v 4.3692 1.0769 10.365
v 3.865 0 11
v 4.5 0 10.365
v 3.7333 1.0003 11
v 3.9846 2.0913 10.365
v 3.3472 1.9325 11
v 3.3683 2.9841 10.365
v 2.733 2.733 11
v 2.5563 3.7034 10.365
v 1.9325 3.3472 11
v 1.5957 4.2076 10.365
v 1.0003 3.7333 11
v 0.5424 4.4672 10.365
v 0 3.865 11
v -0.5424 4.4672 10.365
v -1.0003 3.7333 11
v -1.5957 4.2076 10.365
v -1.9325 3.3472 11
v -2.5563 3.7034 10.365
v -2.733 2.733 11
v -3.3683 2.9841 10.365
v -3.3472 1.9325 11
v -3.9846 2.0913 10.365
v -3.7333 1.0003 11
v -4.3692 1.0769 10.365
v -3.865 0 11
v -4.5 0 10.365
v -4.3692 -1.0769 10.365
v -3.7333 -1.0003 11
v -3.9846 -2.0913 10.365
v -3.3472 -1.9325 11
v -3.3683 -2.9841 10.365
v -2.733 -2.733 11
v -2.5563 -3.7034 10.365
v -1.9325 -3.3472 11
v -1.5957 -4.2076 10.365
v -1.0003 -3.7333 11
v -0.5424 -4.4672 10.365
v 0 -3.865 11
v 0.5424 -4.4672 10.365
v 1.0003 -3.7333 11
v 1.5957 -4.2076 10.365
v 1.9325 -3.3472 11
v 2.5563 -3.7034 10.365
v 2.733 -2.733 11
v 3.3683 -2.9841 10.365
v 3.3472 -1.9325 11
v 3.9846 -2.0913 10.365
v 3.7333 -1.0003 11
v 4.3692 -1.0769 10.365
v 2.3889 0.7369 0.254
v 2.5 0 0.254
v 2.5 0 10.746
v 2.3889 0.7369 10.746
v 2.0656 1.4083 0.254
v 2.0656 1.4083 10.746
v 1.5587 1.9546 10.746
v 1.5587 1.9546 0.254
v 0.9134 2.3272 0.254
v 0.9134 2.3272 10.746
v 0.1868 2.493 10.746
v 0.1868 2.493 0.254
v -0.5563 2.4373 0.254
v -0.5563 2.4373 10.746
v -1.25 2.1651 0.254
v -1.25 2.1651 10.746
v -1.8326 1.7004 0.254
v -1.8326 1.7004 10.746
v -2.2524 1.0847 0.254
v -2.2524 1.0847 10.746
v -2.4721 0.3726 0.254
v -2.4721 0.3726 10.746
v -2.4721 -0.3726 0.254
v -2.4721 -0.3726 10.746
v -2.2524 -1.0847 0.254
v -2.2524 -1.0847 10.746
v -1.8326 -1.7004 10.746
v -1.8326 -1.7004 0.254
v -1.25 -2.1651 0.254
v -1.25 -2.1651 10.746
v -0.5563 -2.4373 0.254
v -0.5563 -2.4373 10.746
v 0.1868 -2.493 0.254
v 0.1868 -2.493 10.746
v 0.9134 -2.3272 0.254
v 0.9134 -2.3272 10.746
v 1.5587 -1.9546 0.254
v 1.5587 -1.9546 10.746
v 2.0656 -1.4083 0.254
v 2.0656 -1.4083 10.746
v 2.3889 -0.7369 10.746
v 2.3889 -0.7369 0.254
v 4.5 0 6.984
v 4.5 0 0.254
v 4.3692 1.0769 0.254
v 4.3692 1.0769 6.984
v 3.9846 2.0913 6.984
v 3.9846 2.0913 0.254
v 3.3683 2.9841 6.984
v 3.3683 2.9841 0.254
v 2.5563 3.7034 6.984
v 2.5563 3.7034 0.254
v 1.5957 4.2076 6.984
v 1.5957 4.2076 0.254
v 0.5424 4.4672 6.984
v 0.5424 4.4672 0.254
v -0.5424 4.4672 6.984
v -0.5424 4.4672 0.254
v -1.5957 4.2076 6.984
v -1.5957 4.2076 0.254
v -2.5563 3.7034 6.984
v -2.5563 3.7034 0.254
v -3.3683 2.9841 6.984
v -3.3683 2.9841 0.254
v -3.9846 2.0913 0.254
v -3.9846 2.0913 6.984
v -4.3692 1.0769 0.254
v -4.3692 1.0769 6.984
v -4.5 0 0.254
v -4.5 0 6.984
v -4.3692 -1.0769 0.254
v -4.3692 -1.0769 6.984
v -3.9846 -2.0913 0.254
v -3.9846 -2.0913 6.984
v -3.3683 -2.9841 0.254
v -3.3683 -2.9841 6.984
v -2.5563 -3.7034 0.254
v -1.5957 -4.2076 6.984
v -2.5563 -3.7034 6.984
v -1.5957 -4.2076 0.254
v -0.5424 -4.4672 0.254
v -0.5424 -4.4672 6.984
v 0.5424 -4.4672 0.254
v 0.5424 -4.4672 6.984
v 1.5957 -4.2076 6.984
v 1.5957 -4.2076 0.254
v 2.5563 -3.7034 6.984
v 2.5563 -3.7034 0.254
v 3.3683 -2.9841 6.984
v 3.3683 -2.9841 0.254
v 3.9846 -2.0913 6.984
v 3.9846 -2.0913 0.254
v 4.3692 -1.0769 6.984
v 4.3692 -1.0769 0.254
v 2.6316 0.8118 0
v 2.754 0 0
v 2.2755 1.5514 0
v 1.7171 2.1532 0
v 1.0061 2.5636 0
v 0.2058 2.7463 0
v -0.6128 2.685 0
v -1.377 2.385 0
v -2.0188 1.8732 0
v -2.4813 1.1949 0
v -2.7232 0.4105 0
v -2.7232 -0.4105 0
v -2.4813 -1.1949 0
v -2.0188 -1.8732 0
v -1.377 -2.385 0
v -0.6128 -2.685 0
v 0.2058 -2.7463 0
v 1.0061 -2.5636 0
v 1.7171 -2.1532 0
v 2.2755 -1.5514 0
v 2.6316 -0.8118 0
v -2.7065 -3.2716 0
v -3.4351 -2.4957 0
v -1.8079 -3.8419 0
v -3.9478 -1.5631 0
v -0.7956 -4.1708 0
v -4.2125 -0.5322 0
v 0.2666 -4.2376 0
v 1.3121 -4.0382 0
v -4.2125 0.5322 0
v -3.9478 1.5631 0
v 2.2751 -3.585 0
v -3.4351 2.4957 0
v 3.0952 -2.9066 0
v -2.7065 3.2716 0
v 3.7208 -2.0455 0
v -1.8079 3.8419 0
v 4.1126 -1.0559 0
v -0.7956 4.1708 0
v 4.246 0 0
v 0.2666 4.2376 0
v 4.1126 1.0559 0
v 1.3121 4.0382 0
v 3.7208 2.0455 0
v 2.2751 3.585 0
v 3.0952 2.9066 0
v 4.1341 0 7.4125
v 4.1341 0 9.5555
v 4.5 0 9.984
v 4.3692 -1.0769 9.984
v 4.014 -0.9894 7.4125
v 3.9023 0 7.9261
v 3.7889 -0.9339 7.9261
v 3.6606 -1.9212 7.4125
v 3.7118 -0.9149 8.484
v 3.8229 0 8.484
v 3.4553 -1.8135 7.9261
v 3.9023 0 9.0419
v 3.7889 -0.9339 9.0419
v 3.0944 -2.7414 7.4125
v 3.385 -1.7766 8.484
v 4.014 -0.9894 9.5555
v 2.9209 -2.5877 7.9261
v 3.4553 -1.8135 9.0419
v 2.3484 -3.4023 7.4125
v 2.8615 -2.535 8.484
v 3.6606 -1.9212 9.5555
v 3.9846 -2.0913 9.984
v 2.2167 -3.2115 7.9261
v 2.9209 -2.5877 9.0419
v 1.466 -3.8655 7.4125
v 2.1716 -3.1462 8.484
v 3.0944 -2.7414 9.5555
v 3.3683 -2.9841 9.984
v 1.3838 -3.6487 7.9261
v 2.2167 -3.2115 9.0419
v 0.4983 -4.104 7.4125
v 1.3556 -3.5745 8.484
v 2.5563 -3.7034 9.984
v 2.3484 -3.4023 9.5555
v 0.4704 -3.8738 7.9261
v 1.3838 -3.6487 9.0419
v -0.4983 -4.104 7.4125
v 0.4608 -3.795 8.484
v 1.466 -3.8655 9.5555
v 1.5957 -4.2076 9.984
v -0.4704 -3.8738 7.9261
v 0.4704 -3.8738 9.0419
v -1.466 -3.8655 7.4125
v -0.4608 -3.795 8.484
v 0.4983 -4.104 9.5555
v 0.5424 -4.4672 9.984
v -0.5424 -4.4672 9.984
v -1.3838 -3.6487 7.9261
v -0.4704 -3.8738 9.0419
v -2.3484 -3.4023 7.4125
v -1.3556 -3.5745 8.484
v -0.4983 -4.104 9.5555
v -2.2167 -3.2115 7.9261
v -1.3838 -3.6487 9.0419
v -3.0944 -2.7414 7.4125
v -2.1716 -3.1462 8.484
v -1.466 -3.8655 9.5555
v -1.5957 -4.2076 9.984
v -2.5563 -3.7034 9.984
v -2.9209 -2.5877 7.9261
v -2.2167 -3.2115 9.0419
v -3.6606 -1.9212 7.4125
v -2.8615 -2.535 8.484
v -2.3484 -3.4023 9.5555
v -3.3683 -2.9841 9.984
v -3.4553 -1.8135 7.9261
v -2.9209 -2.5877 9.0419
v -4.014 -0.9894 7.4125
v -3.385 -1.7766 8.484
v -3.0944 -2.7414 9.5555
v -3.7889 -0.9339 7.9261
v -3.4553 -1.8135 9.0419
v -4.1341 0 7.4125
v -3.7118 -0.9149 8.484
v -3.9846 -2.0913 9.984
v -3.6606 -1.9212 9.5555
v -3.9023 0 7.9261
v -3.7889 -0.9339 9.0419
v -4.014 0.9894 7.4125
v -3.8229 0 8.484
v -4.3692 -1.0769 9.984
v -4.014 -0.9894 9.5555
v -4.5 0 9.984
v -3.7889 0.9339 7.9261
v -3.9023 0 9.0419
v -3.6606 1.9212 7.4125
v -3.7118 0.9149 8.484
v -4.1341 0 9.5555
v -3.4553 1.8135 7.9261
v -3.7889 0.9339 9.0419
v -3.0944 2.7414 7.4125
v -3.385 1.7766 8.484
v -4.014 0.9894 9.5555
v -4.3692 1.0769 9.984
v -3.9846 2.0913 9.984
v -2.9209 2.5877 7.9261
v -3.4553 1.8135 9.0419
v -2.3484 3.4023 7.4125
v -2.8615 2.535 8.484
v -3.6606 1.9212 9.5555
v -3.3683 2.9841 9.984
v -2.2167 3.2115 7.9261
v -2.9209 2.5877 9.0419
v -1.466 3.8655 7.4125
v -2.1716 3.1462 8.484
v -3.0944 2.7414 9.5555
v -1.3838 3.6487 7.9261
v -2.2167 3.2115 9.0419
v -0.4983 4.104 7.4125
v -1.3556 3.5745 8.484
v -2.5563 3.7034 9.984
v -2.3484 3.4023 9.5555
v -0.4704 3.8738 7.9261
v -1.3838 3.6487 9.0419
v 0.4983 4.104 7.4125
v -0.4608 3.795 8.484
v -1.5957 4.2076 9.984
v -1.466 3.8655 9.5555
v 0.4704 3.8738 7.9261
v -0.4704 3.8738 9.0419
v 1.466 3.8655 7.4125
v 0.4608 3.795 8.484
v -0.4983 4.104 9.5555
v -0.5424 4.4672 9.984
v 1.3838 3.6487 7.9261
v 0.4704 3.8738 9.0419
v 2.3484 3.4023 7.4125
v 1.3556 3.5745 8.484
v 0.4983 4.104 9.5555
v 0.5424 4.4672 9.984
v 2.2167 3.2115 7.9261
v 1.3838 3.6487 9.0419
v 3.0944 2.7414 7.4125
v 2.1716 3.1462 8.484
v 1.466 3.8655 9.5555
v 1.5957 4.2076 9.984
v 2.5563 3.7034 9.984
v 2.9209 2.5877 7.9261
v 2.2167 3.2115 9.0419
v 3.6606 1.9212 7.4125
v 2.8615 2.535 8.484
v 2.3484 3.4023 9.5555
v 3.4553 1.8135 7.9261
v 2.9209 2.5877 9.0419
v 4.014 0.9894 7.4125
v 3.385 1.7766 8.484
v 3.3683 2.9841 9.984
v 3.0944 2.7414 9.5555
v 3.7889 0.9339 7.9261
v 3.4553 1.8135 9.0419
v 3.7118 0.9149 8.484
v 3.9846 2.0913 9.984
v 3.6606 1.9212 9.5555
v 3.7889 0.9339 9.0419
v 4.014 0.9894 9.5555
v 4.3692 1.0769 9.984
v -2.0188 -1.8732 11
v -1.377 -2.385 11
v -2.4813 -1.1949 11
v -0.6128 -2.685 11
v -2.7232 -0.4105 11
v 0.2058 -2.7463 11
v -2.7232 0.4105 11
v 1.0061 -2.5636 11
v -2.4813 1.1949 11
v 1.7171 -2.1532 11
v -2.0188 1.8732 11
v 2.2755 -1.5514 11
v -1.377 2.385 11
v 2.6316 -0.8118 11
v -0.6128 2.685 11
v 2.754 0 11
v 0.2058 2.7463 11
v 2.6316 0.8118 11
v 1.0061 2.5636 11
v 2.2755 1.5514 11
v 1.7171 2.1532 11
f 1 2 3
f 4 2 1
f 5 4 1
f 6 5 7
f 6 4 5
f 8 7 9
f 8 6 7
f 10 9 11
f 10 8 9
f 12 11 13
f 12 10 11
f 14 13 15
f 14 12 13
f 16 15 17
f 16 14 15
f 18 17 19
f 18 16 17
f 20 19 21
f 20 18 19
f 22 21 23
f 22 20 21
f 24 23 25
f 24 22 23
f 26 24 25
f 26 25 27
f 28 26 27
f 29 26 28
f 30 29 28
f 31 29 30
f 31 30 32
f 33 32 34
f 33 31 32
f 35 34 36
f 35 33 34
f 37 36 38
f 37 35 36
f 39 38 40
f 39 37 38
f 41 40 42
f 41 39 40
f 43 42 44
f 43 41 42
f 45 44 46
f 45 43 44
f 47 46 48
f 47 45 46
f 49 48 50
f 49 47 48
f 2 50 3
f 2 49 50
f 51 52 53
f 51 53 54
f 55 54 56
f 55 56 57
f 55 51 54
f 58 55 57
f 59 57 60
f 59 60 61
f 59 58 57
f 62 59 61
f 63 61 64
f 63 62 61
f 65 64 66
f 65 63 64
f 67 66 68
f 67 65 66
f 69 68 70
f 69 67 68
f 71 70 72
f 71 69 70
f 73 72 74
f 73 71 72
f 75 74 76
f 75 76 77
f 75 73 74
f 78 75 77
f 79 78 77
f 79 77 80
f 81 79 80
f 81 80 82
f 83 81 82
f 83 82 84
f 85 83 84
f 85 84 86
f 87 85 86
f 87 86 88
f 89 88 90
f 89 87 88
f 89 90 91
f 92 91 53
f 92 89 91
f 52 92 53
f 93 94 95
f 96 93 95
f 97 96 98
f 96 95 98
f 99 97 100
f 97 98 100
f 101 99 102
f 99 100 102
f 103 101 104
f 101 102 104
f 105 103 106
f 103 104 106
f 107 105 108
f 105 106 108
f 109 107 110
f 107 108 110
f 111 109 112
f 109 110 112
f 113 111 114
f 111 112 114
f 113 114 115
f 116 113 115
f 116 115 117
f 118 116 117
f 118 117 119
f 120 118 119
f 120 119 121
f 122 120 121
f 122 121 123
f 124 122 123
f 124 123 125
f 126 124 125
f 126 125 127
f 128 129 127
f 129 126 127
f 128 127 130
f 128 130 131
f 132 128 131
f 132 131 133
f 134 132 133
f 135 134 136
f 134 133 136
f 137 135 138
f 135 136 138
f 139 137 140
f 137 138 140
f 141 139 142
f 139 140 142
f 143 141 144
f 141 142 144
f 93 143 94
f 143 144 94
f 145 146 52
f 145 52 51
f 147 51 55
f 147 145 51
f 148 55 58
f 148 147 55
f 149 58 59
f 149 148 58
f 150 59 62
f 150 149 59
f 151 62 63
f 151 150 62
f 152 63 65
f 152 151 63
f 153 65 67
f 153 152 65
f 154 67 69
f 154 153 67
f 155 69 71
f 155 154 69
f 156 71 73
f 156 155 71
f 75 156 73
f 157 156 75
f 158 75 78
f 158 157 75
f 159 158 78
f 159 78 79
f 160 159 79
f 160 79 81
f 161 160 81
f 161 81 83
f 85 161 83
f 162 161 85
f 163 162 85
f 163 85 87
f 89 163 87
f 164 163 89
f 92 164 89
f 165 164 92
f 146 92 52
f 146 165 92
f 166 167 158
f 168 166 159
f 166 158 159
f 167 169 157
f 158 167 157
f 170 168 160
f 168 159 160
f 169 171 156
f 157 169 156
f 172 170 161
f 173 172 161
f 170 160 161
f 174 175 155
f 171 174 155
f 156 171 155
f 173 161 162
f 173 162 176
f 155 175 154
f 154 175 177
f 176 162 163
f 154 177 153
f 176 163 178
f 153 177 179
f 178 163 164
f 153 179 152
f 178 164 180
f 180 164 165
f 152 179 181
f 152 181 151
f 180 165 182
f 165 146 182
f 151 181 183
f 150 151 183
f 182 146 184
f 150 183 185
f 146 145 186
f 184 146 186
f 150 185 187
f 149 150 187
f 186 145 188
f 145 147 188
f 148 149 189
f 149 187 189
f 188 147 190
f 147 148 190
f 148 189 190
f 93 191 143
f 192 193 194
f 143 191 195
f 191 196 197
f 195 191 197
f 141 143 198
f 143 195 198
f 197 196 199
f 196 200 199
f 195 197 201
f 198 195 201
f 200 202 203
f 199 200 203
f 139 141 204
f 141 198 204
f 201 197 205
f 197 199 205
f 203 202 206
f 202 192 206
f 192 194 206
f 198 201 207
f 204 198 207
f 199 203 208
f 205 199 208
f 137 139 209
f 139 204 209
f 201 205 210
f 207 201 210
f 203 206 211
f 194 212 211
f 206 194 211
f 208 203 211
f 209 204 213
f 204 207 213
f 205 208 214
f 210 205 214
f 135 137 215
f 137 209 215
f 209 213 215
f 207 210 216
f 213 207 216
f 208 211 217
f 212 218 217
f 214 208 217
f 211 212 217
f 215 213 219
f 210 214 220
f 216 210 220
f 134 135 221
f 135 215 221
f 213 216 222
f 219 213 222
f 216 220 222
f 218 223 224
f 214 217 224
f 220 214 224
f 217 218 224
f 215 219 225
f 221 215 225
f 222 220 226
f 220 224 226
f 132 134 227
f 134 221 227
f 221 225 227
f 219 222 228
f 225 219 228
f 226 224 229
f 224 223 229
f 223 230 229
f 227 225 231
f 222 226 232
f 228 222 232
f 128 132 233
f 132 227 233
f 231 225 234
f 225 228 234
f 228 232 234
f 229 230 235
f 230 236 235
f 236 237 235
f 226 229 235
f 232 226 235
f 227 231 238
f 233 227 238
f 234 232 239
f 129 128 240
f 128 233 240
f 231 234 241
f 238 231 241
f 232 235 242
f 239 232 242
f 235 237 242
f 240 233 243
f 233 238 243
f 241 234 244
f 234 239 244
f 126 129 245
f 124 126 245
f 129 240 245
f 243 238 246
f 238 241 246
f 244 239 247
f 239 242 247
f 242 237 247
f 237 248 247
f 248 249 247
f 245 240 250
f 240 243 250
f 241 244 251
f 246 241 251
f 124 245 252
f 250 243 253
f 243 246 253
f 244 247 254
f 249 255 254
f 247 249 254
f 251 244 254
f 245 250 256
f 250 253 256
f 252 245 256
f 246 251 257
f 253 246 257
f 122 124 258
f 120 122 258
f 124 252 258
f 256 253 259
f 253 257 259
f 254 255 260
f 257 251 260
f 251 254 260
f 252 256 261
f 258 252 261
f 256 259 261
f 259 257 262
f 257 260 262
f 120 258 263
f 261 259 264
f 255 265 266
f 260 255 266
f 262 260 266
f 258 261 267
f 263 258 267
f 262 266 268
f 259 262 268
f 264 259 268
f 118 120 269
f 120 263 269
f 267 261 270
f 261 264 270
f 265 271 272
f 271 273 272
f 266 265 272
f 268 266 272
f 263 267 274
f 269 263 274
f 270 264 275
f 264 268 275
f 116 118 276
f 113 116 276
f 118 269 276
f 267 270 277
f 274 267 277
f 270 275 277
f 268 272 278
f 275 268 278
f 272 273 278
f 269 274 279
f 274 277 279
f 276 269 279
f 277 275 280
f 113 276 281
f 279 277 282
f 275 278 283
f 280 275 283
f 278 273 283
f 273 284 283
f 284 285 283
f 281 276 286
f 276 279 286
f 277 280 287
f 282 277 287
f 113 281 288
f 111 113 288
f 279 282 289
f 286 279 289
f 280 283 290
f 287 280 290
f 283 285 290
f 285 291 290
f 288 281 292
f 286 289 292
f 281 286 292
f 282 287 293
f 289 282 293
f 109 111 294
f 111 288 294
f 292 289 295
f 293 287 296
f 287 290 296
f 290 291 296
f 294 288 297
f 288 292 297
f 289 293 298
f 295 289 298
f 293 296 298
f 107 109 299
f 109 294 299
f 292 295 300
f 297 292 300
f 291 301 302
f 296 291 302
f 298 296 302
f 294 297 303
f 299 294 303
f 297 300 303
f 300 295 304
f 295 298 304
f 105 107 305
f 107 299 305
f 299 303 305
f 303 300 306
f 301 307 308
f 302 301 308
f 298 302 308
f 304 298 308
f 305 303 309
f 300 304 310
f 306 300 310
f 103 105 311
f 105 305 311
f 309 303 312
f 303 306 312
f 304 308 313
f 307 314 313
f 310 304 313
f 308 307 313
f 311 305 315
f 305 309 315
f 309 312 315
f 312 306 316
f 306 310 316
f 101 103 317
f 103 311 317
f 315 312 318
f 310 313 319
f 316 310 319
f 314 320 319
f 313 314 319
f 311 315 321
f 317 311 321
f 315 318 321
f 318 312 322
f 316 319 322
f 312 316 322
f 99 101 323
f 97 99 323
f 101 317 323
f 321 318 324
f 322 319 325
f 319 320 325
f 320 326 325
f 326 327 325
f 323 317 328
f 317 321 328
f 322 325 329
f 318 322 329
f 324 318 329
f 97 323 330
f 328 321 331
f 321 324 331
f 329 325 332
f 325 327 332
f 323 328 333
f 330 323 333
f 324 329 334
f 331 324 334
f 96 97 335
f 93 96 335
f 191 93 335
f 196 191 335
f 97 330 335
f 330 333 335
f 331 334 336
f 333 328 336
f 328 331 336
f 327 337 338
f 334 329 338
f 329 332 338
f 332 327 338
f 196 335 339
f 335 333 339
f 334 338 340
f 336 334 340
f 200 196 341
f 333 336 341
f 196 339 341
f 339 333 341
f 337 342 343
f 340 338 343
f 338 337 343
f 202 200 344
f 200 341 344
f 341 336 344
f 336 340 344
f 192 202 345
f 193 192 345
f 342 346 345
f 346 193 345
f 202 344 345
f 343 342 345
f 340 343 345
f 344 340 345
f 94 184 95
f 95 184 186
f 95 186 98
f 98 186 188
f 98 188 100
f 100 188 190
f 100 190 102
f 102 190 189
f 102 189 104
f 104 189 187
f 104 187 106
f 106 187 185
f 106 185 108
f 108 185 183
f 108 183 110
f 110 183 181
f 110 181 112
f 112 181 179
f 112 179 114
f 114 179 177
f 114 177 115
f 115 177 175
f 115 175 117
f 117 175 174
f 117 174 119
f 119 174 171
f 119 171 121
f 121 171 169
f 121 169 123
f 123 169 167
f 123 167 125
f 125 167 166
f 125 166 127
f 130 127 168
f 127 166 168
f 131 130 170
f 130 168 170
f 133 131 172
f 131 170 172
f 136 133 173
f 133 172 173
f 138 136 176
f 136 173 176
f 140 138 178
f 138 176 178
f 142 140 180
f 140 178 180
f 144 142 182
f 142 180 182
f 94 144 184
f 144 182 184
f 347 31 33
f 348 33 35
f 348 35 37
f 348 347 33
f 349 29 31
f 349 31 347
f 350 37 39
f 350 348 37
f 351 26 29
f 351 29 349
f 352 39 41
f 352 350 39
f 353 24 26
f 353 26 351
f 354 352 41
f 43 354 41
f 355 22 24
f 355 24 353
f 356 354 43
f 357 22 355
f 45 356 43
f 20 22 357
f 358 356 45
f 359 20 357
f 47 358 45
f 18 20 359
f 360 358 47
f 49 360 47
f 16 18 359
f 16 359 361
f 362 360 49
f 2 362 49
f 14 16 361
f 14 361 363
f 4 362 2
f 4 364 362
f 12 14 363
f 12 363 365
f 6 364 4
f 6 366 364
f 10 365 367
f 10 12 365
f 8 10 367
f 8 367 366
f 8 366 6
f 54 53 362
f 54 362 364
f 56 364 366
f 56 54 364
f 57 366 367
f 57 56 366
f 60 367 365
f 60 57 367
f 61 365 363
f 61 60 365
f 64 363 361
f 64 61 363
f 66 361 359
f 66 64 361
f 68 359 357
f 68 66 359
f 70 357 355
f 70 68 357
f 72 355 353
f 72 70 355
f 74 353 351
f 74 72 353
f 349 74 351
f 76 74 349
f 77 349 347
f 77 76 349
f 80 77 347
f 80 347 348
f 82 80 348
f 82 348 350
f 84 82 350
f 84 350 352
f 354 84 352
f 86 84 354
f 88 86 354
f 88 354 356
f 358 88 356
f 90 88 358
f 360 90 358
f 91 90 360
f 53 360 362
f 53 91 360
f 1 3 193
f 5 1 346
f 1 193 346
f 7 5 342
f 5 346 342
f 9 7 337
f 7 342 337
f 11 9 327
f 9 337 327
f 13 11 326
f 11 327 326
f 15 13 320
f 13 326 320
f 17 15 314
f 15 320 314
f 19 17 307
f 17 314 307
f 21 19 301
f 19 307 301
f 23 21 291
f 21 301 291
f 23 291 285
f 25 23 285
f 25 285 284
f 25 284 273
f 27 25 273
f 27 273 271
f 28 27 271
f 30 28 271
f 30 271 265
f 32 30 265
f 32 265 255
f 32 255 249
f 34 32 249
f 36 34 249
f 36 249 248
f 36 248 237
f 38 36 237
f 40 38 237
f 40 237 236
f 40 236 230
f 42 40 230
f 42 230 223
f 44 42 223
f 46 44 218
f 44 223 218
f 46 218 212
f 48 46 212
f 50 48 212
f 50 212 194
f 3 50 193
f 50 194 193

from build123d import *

# Parameters (mm, degrees)
SKETCH1_R           = 4.5
SKETCH1_R_2         = 2.5
BOSS_EXTRUDE1_DEPTH = 11
SKETCH2_R           = 2
CHAMFER1_SIZE       = 0.635
CHAMFER2_SIZE       = 0.254


with BuildPart() as part:
    # Sketch1 → Boss-Extrude1 (new body)
    with BuildSketch(Plane.XY):
        Circle(SKETCH1_R)
        Circle(SKETCH1_R_2, mode=Mode.SUBTRACT)
    extrude(amount=BOSS_EXTRUDE1_DEPTH)

    # Sketch2 → Cut-Revolve1 (revolve, cut)
    with BuildSketch(Plane(origin=(0, 0, 0), x_dir=(-1, 0, 0), z_dir=(0, -1, 0)), mode=Mode.PRIVATE) as cut_revolve1_sk:
        with Locations((5.822875656, -8.484)):
            Circle(SKETCH2_R)
    revolve(cut_revolve1_sk.sketch.rotate(Axis((0, 0, 11), (0, 0, -1)), 180), axis=Axis((0, 0, 11), (0, 0, -1)), mode=Mode.SUBTRACT)

    # Chamfer1
    chamfer1_edges = [part.edges().sort_by_distance(p)[0] for p in [
        (-4.5, 0, 11),
    ]]
    chamfer(chamfer1_edges, length=CHAMFER1_SIZE)

    # Chamfer2
    chamfer2_edges = [part.edges().sort_by_distance(p)[0] for p in [
        (-4.5, 0, 0),
        (-2.5, 0, 0),
        (-2.5, 0, 11),
    ]]
    chamfer(chamfer2_edges, length=CHAMFER2_SIZE)


solid = part.part
